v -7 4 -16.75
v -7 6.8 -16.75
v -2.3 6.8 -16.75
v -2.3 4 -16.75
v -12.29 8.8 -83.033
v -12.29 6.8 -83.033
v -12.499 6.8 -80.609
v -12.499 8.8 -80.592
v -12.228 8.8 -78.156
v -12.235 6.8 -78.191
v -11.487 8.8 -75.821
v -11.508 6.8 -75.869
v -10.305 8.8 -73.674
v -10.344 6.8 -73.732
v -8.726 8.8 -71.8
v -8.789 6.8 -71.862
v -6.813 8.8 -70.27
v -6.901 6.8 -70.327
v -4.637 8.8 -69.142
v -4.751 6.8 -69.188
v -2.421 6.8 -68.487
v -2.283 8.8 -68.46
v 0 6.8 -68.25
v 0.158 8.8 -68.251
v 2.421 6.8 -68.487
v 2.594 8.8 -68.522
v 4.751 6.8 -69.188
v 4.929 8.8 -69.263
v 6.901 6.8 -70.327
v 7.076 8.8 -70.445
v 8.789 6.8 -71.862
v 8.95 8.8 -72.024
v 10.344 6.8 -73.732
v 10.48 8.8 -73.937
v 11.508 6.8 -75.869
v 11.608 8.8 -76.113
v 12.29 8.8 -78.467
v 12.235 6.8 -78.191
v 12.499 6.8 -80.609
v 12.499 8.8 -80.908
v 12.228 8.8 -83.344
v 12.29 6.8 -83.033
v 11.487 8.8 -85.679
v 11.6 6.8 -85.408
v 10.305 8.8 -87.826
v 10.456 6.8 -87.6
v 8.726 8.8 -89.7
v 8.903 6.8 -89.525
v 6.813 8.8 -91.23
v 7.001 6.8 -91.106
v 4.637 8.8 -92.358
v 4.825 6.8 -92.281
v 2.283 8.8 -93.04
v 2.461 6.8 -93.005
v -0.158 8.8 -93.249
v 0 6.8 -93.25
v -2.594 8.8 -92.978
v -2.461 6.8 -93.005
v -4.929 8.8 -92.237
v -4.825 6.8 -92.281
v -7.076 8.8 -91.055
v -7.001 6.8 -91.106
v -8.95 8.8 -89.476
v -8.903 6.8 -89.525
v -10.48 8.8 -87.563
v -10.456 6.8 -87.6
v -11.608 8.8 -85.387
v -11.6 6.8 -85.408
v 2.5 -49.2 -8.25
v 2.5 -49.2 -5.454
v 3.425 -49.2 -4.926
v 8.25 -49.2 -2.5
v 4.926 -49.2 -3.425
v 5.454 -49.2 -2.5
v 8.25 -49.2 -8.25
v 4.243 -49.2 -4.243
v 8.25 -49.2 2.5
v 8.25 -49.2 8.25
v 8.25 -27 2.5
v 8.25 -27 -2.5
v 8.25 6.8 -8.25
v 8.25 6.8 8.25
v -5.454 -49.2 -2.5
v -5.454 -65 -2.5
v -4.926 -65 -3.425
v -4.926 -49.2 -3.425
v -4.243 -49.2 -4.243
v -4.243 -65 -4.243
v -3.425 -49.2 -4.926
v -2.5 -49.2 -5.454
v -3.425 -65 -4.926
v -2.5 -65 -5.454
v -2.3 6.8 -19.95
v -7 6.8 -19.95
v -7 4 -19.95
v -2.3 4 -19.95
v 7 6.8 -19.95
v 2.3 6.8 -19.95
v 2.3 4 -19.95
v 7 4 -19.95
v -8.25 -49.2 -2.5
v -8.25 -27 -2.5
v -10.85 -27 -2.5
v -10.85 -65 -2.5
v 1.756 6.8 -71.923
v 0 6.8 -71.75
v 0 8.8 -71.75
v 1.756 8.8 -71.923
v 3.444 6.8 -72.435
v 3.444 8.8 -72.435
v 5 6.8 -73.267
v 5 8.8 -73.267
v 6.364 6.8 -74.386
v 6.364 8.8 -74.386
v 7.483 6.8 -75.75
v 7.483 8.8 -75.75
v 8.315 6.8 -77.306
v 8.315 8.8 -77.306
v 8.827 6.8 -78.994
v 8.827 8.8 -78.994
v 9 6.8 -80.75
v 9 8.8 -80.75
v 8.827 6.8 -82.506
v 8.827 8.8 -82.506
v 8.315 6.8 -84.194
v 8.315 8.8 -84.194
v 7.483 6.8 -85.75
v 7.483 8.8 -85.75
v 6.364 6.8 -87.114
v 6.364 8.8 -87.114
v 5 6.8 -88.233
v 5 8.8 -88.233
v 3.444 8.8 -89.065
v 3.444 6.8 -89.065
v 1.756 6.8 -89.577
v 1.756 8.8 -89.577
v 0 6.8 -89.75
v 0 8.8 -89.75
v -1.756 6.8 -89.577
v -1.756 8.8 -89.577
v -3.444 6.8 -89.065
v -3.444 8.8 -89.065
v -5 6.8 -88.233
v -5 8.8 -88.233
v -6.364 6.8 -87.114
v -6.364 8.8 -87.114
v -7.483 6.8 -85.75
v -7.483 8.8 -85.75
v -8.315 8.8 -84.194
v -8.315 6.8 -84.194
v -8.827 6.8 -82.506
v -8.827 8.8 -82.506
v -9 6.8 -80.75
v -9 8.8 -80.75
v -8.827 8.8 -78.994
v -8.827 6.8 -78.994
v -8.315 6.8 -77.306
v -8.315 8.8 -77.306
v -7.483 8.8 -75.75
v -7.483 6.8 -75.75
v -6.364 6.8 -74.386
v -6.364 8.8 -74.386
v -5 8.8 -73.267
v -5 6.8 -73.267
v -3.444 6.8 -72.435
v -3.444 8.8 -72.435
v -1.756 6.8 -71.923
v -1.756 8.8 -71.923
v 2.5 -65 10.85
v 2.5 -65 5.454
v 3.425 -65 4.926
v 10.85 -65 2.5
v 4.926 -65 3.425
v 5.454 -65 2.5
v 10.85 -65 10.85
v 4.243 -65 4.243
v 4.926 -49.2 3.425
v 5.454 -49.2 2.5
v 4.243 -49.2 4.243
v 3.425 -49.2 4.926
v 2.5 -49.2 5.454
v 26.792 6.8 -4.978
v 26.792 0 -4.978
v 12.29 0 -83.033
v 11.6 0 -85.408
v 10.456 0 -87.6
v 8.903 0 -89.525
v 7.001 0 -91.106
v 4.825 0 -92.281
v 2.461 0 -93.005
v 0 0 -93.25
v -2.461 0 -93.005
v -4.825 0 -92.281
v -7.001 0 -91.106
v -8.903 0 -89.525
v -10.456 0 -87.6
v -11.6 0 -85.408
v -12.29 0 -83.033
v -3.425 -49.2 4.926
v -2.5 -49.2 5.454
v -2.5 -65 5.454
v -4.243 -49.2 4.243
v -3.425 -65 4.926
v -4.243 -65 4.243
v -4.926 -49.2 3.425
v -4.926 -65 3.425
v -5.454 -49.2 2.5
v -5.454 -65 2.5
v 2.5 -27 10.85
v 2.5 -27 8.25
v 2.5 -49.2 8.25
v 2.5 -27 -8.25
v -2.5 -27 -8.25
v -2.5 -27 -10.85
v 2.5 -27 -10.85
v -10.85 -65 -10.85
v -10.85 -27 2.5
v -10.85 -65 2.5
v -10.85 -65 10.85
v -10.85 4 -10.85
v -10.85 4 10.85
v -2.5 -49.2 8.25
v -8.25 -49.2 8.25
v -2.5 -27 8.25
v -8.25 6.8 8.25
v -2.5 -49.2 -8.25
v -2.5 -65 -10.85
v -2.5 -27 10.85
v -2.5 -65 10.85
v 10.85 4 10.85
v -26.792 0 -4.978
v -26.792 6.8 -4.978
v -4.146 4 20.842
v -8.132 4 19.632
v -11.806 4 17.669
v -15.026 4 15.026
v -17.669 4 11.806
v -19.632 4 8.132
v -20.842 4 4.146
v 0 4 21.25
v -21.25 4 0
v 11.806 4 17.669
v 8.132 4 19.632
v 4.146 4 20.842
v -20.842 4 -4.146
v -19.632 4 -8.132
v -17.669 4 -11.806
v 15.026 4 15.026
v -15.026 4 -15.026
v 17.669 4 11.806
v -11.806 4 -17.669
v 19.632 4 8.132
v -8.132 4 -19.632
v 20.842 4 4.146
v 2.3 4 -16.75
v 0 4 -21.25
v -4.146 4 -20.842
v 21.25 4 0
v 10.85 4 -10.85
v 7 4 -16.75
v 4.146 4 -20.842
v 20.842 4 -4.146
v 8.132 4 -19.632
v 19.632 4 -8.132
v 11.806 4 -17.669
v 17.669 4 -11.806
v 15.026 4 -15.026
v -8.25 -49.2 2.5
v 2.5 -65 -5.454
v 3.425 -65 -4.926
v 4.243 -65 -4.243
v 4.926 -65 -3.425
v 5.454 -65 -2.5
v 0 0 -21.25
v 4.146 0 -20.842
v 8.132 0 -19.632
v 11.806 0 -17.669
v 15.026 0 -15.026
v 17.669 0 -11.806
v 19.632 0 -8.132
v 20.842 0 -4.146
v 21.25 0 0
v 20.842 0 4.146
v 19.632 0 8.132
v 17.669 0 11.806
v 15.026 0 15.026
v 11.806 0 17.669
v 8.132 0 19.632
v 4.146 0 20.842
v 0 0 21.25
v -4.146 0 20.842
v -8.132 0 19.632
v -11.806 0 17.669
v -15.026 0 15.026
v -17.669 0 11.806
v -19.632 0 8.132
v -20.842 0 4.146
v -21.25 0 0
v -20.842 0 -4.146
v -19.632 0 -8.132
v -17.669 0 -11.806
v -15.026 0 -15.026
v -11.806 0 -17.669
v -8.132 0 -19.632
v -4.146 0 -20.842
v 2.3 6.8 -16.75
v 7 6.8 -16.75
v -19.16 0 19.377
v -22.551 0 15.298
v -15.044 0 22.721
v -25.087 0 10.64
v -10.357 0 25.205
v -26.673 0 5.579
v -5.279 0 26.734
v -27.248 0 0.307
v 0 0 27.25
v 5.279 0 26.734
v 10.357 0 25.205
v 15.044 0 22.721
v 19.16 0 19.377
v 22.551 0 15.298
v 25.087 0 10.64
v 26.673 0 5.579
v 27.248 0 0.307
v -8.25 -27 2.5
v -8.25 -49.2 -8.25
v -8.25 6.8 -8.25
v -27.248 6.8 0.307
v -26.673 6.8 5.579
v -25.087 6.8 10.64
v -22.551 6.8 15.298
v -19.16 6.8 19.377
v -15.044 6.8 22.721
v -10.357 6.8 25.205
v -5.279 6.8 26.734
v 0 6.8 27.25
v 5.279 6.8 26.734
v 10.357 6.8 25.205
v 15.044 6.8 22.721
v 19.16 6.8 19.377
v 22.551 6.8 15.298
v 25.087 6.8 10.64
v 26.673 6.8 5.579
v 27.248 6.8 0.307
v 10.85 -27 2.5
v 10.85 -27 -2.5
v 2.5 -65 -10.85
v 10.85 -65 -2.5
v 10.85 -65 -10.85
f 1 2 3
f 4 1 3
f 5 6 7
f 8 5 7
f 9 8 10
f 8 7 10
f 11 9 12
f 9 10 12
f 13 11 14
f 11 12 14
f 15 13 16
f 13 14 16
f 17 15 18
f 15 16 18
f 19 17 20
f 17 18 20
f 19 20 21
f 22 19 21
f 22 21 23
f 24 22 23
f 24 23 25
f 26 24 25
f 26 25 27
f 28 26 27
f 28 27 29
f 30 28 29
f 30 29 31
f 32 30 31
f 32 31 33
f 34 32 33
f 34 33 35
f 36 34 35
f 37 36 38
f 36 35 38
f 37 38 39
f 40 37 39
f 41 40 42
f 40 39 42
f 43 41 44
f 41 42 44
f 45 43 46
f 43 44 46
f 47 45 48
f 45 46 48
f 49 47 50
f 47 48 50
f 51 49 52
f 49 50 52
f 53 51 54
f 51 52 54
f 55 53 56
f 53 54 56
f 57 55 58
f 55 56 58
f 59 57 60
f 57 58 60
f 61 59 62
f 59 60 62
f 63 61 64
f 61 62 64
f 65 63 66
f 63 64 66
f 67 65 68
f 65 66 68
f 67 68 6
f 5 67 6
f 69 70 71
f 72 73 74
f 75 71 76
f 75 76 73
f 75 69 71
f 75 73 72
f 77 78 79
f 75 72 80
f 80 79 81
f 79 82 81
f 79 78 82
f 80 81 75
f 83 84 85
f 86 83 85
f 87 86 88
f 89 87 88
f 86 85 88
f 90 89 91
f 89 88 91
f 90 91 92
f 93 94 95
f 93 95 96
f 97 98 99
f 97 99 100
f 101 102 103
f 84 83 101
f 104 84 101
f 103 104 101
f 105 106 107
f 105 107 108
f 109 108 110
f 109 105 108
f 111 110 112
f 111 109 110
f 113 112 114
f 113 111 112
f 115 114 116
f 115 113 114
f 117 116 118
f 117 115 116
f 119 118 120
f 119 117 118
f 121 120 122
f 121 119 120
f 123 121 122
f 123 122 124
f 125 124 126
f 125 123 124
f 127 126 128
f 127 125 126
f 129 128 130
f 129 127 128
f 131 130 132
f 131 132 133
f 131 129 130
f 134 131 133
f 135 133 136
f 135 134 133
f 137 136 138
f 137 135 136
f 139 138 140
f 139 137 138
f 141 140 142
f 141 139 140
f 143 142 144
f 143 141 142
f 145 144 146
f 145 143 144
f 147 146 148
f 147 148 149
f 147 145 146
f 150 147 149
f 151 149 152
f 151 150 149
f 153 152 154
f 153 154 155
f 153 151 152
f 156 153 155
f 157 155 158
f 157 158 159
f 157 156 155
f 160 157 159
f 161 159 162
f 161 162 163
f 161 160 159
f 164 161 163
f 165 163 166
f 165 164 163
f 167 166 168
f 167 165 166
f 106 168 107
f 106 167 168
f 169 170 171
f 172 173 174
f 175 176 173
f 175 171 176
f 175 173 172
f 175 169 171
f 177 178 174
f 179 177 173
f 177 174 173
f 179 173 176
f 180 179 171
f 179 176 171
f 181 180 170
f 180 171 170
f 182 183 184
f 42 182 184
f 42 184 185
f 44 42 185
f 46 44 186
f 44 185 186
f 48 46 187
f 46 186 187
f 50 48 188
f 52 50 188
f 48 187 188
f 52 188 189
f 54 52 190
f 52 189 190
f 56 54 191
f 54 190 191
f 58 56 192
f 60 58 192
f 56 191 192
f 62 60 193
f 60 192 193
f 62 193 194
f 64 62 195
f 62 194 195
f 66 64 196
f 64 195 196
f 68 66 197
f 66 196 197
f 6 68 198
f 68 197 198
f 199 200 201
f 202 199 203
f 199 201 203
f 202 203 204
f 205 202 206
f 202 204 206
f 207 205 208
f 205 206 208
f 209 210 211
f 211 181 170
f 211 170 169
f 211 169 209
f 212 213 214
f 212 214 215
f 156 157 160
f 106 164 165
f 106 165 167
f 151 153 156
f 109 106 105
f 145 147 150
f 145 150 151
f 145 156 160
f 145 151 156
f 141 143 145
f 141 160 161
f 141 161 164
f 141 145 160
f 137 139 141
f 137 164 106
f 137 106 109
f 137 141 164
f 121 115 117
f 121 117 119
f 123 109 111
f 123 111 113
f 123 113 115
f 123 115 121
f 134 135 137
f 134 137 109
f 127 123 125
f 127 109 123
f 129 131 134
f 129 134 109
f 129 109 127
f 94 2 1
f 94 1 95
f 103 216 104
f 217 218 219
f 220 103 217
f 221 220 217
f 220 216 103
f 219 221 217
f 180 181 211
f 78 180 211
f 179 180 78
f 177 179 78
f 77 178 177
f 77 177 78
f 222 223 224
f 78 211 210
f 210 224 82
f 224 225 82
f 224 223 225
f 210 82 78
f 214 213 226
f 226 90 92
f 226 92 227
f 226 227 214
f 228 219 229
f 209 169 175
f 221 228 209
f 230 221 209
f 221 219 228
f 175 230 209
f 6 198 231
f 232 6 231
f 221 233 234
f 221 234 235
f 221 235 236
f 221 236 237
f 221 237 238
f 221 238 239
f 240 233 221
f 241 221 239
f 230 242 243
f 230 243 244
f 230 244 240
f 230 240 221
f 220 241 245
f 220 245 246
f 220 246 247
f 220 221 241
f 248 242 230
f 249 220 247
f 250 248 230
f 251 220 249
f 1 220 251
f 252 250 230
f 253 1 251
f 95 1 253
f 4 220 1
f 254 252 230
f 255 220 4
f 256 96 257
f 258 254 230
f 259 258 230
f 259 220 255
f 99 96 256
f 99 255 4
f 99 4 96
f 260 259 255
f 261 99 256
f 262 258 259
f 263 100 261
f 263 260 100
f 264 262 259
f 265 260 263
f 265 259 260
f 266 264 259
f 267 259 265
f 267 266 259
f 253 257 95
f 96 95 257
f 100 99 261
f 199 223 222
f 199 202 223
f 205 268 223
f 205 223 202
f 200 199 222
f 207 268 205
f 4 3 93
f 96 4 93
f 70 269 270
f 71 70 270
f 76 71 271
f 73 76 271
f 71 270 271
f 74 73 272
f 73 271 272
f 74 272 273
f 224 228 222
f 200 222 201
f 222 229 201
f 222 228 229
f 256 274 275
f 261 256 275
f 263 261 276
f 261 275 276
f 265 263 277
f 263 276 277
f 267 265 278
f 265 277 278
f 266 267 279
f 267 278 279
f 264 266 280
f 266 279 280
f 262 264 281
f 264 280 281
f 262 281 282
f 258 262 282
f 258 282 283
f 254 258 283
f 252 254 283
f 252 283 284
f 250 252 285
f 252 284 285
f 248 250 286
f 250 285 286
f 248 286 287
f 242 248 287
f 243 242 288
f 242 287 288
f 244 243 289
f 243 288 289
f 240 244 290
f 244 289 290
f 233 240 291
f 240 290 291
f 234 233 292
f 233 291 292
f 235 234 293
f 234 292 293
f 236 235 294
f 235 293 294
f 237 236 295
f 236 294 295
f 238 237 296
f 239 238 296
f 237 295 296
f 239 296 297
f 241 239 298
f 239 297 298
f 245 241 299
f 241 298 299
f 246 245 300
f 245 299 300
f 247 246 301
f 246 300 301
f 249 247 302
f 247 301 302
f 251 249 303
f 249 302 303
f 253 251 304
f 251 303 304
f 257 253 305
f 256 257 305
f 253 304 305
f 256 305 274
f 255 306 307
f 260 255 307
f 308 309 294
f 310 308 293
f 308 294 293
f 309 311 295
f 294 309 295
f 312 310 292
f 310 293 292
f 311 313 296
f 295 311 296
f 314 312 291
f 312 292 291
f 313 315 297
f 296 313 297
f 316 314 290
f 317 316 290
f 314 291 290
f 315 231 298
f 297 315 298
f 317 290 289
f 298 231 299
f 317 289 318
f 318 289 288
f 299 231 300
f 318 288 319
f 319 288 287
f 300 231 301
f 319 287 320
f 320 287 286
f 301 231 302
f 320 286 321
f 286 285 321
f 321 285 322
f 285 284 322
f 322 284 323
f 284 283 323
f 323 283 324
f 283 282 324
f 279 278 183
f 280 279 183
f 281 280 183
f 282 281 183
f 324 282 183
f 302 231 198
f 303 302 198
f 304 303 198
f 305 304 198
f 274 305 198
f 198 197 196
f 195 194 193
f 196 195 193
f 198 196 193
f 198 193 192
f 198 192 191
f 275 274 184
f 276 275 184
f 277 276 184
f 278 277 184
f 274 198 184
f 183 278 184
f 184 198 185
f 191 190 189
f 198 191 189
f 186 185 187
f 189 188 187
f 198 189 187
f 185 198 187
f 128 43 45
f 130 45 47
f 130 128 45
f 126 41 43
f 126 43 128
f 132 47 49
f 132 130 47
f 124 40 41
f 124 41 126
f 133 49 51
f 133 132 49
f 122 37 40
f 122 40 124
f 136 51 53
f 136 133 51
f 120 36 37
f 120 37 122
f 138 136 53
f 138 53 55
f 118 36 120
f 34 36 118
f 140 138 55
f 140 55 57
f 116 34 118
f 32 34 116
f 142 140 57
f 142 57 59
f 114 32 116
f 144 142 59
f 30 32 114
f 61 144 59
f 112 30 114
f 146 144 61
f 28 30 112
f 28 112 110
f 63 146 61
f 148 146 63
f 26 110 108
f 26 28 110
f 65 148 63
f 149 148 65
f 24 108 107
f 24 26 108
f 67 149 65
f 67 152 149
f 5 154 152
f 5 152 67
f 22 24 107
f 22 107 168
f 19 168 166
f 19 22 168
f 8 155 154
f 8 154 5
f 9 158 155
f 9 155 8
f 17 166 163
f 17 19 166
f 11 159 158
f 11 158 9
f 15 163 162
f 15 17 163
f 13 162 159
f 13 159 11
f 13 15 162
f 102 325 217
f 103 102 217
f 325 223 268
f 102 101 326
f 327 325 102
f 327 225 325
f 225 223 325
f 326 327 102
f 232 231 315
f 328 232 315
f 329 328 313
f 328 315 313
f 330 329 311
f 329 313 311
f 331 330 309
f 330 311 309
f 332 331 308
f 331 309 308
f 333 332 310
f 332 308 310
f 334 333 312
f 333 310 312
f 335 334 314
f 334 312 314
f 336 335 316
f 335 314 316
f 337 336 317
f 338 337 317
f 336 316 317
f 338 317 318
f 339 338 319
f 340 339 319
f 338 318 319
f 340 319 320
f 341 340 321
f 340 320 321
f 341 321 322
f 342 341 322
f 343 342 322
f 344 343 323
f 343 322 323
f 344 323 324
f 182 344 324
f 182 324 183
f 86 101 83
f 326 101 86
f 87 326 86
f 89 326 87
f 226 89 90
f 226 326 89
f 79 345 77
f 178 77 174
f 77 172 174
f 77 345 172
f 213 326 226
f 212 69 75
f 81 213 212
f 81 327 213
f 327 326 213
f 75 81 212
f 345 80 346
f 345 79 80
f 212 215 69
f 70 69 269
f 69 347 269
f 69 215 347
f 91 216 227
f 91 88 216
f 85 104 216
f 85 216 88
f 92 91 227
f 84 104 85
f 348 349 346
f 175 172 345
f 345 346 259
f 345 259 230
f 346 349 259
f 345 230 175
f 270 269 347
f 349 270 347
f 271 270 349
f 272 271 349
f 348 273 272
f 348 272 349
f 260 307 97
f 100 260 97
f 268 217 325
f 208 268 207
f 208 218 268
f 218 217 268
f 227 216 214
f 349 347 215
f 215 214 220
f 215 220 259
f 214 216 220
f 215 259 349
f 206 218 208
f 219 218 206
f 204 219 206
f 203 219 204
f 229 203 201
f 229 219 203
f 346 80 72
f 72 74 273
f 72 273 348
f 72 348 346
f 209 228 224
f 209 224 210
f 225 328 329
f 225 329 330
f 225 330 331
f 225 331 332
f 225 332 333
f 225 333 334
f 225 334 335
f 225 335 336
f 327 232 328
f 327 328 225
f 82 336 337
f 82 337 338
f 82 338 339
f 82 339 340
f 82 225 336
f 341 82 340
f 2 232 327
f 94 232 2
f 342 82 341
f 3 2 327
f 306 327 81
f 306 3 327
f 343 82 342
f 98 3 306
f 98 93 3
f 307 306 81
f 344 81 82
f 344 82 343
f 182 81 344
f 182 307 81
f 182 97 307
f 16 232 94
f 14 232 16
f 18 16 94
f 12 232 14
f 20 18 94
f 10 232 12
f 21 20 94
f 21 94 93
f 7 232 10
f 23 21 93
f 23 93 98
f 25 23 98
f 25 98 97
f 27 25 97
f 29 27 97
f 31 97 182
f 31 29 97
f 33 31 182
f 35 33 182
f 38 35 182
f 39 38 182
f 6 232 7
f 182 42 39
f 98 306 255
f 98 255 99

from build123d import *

# Parameters (mm, degrees)
BOSS_EXTRUDE1_DEPTH = 6.8
SKETCH2_R           = 12.5
SKETCH2_R_2         = 9
BOSS_EXTRUDE2_DEPTH = 2
SKETCH3_W           = 4.7
SKETCH3_H           = 3.2
CUT_EXTRUDE1_DEPTH  = 10
SKETCH7_R           = 21.25
CUT_EXTRUDE4_DEPTH  = 4
SKETCH8_W           = 21.7
SKETCH8_H           = 21.7
BOSS_EXTRUDE3_DEPTH = 69
SKETCH9_W           = 16.5
SKETCH9_H           = 16.5
CUT_EXTRUDE5_DEPTH  = 56
SKETCH10_R          = 6
CUT_EXTRUDE6_DEPTH  = 99
CUT_EXTRUDE7_DEPTH  = 38


with BuildPart() as part:
    # Sketch1 → Boss-Extrude1 (new body)
    with BuildSketch(Plane(origin=(0, 0, 0), x_dir=(1, 0, 0), z_dir=(0, 1, 0))):
        with BuildLine():
            Line((-12.289695868, 83.033281734), (-26.791536992, 4.97755418))
            ThreePointArc((-26.791536992, 4.97755418), (0, -27.25), (26.791536992, 4.97755418))
            Line((26.791536992, 4.97755418), (12.289695868, 83.033281734))
            ThreePointArc((12.289695868, 83.033281734), (0, 93.25), (-12.289695868, 83.033281734))
        make_face()
    extrude(amount=BOSS_EXTRUDE1_DEPTH)

    # Sketch2 → Boss-Extrude2 (add)
    with BuildSketch(Plane(origin=(0, 6.8, 0), x_dir=(1, 0, 0), z_dir=(0, 1, 0))):
        with Locations(Location((0, 80.75, 0), (0, 0, 169.47511628))):
            Circle(SKETCH2_R)
        with Locations(Location((0, 80.75, 0), (0, 0, 270))):
            Circle(SKETCH2_R_2, mode=Mode.SUBTRACT)
    extrude(amount=BOSS_EXTRUDE2_DEPTH)

    # Sketch3 → Cut-Extrude1 (cut)
    with BuildSketch(Plane(origin=(0, 6.8, 0), x_dir=(1, 0, 0), z_dir=(0, 1, 0))):
        with Locations((4.65, 18.35)):
            Rectangle(SKETCH3_W, SKETCH3_H)
        with Locations((-4.65, 18.35)):
            Rectangle(SKETCH3_W, SKETCH3_H)
    extrude(amount=-CUT_EXTRUDE1_DEPTH, mode=Mode.SUBTRACT)

    # Sketch7 → Cut-Extrude4 (cut)
    with BuildSketch(Plane.XZ):
        with Locations(Location((0, 0, 0), (0, 0, 270))):
            Circle(SKETCH7_R)
    extrude(amount=-CUT_EXTRUDE4_DEPTH, mode=Mode.SUBTRACT)

    # Sketch8 → Boss-Extrude3 (add)
    with BuildSketch(Plane.XZ.offset(-4)):
        Rectangle(SKETCH8_W, SKETCH8_H)
    extrude(amount=BOSS_EXTRUDE3_DEPTH)

    # Sketch9 → Cut-Extrude5 (cut)
    with BuildSketch(Plane(origin=(0, 6.8, 0), x_dir=(1, 0, 0), z_dir=(0, 1, 0))):
        Rectangle(SKETCH9_W, SKETCH9_H)
    extrude(amount=-CUT_EXTRUDE5_DEPTH, mode=Mode.SUBTRACT)

    # Sketch10 → Cut-Extrude6 (cut)
    with BuildSketch(Plane.XZ.offset(65)):
        with Locations(Location((0, 0, 0), (0, 0, 270))):
            Circle(SKETCH10_R)
    extrude(amount=-CUT_EXTRUDE6_DEPTH, mode=Mode.SUBTRACT)

    # Sketch11 → Cut-Extrude7 (cut)
    with BuildSketch(Plane.XZ.offset(65)):
        with BuildLine():
            Line((-6, 2.5), (-5.454356057, 2.5))
            ThreePointArc((-5.454356057, 2.5), (-6, 0), (-5.454356057, -2.5))
            Line((-5.454356057, -2.5), (-6, -2.5))
            Line((-6, -2.5), (-10.85, -2.5))
            Line((-10.85, -2.5), (-10.85, 2.5))
            Line((-10.85, 2.5), (-6, 2.5))
        make_face()
        with BuildLine():
            Line((-2.5, 6), (-2.5, 5.454356057))
            ThreePointArc((-2.5, 5.454356057), (0, 6), (2.5, 5.454356057))
            Line((2.5, 5.454356057), (2.5, 6))
            Line((2.5, 6), (2.5, 10.85))
            Line((2.5, 10.85), (-2.5, 10.85))
            Line((-2.5, 10.85), (-2.5, 6))
        make_face()
        with BuildLine():
            Line((-2.5, -6), (-2.5, -10.85))
            Line((-2.5, -10.85), (2.5, -10.85))
            Line((2.5, -10.85), (2.5, -6))
            Line((2.5, -6), (2.5, -5.454356057))
            ThreePointArc((2.5, -5.454356057), (0, -6), (-2.5, -5.454356057))
            Line((-2.5, -5.454356057), (-2.5, -6))
        make_face()
        with BuildLine():
            Line((6, -2.5), (10.85, -2.5))
            Line((10.85, -2.5), (10.85, 2.5))
            Line((10.85, 2.5), (6, 2.5))
            Line((6, 2.5), (5.454356057, 2.5))
            ThreePointArc((5.454356057, 2.5), (6, 0), (5.454356057, -2.5))
            Line((5.454356057, -2.5), (6, -2.5))
        make_face()
    extrude(amount=-CUT_EXTRUDE7_DEPTH, mode=Mode.SUBTRACT)


solid = part.part
